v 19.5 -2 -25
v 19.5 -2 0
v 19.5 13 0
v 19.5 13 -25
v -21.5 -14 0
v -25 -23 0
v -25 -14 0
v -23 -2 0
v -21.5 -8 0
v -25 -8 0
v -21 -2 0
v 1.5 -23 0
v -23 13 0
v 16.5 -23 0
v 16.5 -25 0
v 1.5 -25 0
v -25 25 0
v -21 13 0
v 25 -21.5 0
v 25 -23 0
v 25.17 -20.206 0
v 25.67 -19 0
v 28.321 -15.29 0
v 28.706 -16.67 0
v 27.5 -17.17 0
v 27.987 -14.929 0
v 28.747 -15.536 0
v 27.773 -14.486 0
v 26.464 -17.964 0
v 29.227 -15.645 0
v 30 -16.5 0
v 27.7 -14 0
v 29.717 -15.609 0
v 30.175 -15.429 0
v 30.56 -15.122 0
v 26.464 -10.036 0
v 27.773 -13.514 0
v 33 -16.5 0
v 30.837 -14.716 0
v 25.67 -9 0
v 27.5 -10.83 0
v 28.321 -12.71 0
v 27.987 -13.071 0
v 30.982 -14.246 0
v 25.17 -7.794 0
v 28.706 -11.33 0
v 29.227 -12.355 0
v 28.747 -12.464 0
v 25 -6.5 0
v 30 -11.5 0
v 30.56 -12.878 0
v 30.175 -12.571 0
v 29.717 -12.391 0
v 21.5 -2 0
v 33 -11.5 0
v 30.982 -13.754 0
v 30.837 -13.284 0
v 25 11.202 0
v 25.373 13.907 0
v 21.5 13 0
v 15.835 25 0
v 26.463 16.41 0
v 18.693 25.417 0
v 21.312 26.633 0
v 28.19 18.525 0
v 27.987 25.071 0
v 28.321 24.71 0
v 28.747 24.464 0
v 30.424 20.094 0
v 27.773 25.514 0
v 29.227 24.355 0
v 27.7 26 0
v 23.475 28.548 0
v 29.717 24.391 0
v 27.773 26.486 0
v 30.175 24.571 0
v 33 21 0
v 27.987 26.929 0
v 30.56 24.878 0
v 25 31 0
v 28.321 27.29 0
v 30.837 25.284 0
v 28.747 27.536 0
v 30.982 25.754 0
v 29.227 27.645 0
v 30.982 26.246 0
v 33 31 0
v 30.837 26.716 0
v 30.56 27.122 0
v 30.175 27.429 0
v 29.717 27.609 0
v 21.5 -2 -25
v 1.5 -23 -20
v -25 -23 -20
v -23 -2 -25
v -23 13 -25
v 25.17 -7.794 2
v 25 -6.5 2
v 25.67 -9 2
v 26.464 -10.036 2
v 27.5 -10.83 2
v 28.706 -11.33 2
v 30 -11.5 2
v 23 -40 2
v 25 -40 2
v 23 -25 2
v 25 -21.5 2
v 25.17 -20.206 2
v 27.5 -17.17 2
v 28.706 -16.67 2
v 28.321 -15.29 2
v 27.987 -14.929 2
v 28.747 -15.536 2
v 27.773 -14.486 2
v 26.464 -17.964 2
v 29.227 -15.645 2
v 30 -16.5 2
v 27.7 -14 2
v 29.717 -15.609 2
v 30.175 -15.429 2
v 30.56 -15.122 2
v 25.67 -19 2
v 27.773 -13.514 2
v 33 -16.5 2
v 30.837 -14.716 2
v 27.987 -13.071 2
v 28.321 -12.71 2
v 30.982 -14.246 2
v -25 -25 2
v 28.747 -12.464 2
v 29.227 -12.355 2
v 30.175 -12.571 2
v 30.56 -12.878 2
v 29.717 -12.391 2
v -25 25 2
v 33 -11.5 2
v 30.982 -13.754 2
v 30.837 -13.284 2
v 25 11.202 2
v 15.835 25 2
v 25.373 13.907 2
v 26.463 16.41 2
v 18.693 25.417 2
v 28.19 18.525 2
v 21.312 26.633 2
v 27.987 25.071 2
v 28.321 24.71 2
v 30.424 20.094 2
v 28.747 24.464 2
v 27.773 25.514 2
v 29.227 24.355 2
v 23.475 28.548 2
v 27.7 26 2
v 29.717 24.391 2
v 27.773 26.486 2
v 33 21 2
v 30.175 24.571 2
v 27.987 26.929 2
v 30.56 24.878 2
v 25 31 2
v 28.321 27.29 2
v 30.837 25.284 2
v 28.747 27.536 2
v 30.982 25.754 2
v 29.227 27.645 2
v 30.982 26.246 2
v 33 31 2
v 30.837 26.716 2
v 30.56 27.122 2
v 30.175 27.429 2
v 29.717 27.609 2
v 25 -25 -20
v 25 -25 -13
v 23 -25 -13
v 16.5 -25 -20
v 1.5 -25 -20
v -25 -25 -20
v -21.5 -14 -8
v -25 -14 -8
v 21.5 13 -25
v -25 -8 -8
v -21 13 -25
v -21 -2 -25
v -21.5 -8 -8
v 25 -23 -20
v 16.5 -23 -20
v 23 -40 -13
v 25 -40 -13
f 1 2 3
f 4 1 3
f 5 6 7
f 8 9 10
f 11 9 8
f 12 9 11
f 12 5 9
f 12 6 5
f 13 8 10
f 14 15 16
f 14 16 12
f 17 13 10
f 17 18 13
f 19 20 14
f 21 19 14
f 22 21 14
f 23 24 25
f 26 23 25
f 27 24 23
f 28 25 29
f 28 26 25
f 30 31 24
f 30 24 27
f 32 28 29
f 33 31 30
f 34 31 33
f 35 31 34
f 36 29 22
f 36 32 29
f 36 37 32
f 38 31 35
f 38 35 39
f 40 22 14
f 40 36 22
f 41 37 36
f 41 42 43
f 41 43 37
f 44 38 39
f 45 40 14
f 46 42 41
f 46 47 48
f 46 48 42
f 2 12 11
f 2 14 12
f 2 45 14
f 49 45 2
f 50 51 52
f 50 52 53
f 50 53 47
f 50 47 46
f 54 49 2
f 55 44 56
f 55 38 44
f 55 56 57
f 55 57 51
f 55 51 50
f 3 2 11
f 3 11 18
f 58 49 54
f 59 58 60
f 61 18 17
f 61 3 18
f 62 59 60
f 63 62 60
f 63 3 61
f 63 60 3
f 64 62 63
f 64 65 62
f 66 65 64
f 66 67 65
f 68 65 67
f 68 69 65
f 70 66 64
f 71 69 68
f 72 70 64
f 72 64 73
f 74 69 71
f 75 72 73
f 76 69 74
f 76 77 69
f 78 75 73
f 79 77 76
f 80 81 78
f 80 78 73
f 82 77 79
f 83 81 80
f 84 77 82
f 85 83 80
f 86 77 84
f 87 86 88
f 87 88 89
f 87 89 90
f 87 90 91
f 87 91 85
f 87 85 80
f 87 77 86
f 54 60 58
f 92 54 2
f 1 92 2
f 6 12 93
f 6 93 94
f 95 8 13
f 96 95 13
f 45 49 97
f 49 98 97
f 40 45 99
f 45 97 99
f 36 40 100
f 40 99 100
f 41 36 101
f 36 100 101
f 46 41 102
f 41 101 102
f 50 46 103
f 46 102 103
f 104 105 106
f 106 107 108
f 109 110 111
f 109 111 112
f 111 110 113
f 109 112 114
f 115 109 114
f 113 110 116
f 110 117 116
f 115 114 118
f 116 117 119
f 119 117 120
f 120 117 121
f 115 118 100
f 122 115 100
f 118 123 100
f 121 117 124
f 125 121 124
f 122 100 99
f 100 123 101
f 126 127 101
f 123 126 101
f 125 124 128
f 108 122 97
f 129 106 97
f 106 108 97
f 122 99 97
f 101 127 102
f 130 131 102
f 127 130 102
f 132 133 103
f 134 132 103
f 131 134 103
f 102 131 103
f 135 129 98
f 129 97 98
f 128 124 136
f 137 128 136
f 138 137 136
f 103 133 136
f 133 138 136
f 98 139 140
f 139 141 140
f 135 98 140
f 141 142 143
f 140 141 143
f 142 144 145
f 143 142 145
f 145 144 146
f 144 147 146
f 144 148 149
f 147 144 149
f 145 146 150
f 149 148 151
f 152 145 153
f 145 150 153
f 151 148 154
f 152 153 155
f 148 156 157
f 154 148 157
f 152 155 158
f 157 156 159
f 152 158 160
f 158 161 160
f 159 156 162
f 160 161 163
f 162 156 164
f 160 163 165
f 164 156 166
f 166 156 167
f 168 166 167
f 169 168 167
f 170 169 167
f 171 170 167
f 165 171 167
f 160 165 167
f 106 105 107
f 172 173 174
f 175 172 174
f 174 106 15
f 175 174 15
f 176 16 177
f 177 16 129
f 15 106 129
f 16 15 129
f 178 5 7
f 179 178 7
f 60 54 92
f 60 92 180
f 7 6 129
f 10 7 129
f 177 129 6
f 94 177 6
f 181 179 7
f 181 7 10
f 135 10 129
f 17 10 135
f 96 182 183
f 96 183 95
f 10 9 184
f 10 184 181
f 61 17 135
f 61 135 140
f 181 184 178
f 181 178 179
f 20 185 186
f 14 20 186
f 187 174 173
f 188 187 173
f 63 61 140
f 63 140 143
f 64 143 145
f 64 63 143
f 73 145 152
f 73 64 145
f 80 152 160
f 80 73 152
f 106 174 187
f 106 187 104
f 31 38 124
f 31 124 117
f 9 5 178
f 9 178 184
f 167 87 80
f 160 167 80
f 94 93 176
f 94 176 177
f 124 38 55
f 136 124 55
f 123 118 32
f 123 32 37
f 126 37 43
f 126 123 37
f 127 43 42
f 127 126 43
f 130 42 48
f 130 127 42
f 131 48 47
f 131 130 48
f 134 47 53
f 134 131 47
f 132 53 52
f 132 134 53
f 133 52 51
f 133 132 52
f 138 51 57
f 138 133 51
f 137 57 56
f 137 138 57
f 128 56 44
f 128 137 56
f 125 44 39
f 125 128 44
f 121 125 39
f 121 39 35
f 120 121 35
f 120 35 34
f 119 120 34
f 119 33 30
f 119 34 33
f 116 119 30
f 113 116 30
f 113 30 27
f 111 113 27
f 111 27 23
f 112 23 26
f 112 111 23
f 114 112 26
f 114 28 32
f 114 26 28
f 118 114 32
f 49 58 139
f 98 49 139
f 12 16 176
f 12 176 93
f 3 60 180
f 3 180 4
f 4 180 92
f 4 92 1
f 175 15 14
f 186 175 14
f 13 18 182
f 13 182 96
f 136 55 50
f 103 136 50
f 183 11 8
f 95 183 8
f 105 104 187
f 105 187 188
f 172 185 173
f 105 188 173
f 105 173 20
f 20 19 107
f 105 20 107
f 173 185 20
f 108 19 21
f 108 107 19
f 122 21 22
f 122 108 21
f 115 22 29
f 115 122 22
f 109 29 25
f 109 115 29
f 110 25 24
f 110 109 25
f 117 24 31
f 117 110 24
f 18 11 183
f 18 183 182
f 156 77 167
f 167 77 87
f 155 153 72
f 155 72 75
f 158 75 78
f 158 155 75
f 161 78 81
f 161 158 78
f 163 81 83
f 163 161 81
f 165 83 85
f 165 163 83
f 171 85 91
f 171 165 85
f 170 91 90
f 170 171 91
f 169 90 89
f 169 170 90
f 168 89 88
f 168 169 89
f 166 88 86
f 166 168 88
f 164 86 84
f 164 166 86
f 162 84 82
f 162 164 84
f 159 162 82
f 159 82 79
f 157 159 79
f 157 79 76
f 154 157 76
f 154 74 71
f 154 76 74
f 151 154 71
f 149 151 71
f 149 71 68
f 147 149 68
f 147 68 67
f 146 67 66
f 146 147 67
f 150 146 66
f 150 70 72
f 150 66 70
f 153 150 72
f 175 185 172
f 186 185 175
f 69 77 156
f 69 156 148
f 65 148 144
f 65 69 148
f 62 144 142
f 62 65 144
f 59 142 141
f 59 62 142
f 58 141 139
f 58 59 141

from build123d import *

# Parameters (mm, degrees)
SKETCH1_W               = 50
SKETCH1_H               = 50
BOSS_EXTRUDE1_DEPTH     = 2
SKETCH2_W               = 8.5
SKETCH2_H               = 2
SKETCH2_W_2             = 26.5
BOSS_EXTRUDE2_DEPTH     = 20
SKETCH3_W               = 2
SKETCH3_H               = 15
BOSS_EXTRUDE3_DEPTH     = 15
SKETCH5_W               = 2
SKETCH5_H               = 15
BOSS_EXTRUDE5_DEPTH     = 25
SKETCH6_W               = 8
SKETCH6_H               = 5
SKETCH6_H_2             = 10
BOSS_EXTRUDE6_DEPTH     = 2
FILLET1_R               = 10
FILLET2_R               = 10
FILLET3_R               = 5
CUT_EXTRUDE1_DEPTH      = 58.567351858
CUT_EXTRUDE1_DEPTH_BACK = 58.567351858
SKETCH7_R               = 1.65
SKETCH8_W               = 3.5
SKETCH8_H               = 6
BOSS_EXTRUDE7_DEPTH     = 8


with BuildPart() as part:
    # Sketch1 → Boss-Extrude1 (new body)
    with BuildSketch(Plane.XY):
        Rectangle(SKETCH1_W, SKETCH1_H)
    extrude(amount=BOSS_EXTRUDE1_DEPTH)

    # Sketch2 → Boss-Extrude2 (add)
    with BuildSketch(Plane(origin=(0, 0, 0), x_dir=(-1, 0, 0), z_dir=(0, 0, -1))):
        with Locations((-20.75, -24)):
            Rectangle(SKETCH2_W, SKETCH2_H)
        with Locations((11.75, -24)):
            Rectangle(SKETCH2_W_2, SKETCH2_H)
    extrude(amount=BOSS_EXTRUDE2_DEPTH)

    # Sketch3 → Boss-Extrude3 (add)
    with BuildSketch(Plane.XZ.offset(25)):
        with Locations((24, -5.5)):
            Rectangle(SKETCH3_W, SKETCH3_H)
    extrude(amount=BOSS_EXTRUDE3_DEPTH)

    # Sketch5 → Boss-Extrude5 (add)
    with BuildSketch(Plane(origin=(0, 0, 0), x_dir=(-1, 0, 0), z_dir=(0, 0, -1))):
        with Locations((-20.5, 5.5)):
            Rectangle(SKETCH5_W, SKETCH5_H)
        with Locations((22, 5.5)):
            Rectangle(SKETCH5_W, SKETCH5_H)
    extrude(amount=BOSS_EXTRUDE5_DEPTH)

    # Sketch6 → Boss-Extrude6 (add)
    with BuildSketch(Plane(origin=(0, 0, 0), x_dir=(-1, 0, 0), z_dir=(0, 0, -1))):
        with Locations((-29, -14)):
            Rectangle(SKETCH6_W, SKETCH6_H)
        with Locations((-29, 26)):
            Rectangle(SKETCH6_W, SKETCH6_H_2)
    extrude(amount=-BOSS_EXTRUDE6_DEPTH)

    # Fillet1
    # the kernel refuses this fillet: 10 mm, written as the material it adds along each edge
    with BuildSketch(Plane(origin=(25, 25, 0), x_dir=(-1, 0, 0), z_dir=(0, 0, 1))) as fillet1_piece_1:
        with BuildLine():
            CenterArc((9.16515139, -10), FILLET1_R, 90, 66.421821522)
            Line((0, -6), (-0.183303028, -5.92))
            ThreePointArc((-0.183303028, -5.92), (-0.2, -3), (-0.2, 0))
            Line((-0.2, 0), (0, 0.2))
            Line((0, 0.2), (9.16515139, 0.2))
            Line((9.16515139, 0.2), (9.16515139, 0))
        make_face()
    extrude(amount=2)

    # Fillet2
    # the kernel refuses this fillet: 10 mm, written as the material it adds along each edge
    with BuildSketch(Plane(origin=(25, 21, 0), x_dir=(0, -1, 0), z_dir=(0, 0, 1))) as fillet2_piece_1:
        with BuildLine():
            CenterArc((9.797958971, 10), FILLET2_R, 191.536959033, 78.463040967)
            Line((0, 8), (-0.195959179, 7.96))
            ThreePointArc((-0.195959179, 7.96), (-0.2, 4), (-0.2, 0))
            Line((-0.2, 0), (0, -0.2))
            Line((0, -0.2), (9.797958971, -0.2))
            Line((9.797958971, -0.2), (9.797958971, 0))
        make_face()
    extrude(amount=2)

    # Fillet3
    fillet3_edges = [part.edges().sort_by_distance(p)[0] for p in [
        (25, -16.5, 1),
        (25, -11.5, 1),
    ]]
    fillet(fillet3_edges, radius=FILLET3_R)

    # Sketch7 → Cut-Extrude1 (cut, two sides: drawn at the far end of the back side and taken through both)
    with BuildSketch(Plane(origin=(0, 0, 0), x_dir=(-1, 0, 0), z_dir=(0, 0, -1)).offset(-CUT_EXTRUDE1_DEPTH_BACK)):
        with Locations((-29.35, -14)):
            Circle(SKETCH7_R)
        with Locations((-29.35, 26)):
            Circle(SKETCH7_R)
    extrude(amount=CUT_EXTRUDE1_DEPTH + CUT_EXTRUDE1_DEPTH_BACK, mode=Mode.SUBTRACT)

    # Sketch8 → Boss-Extrude7 (add)
    with BuildSketch(Plane(origin=(0, 0, 0), x_dir=(-1, 0, 0), z_dir=(0, 0, -1))):
        with Locations((23.25, -11)):
            Rectangle(SKETCH8_W, SKETCH8_H)
    extrude(amount=BOSS_EXTRUDE7_DEPTH)


solid = part.part
